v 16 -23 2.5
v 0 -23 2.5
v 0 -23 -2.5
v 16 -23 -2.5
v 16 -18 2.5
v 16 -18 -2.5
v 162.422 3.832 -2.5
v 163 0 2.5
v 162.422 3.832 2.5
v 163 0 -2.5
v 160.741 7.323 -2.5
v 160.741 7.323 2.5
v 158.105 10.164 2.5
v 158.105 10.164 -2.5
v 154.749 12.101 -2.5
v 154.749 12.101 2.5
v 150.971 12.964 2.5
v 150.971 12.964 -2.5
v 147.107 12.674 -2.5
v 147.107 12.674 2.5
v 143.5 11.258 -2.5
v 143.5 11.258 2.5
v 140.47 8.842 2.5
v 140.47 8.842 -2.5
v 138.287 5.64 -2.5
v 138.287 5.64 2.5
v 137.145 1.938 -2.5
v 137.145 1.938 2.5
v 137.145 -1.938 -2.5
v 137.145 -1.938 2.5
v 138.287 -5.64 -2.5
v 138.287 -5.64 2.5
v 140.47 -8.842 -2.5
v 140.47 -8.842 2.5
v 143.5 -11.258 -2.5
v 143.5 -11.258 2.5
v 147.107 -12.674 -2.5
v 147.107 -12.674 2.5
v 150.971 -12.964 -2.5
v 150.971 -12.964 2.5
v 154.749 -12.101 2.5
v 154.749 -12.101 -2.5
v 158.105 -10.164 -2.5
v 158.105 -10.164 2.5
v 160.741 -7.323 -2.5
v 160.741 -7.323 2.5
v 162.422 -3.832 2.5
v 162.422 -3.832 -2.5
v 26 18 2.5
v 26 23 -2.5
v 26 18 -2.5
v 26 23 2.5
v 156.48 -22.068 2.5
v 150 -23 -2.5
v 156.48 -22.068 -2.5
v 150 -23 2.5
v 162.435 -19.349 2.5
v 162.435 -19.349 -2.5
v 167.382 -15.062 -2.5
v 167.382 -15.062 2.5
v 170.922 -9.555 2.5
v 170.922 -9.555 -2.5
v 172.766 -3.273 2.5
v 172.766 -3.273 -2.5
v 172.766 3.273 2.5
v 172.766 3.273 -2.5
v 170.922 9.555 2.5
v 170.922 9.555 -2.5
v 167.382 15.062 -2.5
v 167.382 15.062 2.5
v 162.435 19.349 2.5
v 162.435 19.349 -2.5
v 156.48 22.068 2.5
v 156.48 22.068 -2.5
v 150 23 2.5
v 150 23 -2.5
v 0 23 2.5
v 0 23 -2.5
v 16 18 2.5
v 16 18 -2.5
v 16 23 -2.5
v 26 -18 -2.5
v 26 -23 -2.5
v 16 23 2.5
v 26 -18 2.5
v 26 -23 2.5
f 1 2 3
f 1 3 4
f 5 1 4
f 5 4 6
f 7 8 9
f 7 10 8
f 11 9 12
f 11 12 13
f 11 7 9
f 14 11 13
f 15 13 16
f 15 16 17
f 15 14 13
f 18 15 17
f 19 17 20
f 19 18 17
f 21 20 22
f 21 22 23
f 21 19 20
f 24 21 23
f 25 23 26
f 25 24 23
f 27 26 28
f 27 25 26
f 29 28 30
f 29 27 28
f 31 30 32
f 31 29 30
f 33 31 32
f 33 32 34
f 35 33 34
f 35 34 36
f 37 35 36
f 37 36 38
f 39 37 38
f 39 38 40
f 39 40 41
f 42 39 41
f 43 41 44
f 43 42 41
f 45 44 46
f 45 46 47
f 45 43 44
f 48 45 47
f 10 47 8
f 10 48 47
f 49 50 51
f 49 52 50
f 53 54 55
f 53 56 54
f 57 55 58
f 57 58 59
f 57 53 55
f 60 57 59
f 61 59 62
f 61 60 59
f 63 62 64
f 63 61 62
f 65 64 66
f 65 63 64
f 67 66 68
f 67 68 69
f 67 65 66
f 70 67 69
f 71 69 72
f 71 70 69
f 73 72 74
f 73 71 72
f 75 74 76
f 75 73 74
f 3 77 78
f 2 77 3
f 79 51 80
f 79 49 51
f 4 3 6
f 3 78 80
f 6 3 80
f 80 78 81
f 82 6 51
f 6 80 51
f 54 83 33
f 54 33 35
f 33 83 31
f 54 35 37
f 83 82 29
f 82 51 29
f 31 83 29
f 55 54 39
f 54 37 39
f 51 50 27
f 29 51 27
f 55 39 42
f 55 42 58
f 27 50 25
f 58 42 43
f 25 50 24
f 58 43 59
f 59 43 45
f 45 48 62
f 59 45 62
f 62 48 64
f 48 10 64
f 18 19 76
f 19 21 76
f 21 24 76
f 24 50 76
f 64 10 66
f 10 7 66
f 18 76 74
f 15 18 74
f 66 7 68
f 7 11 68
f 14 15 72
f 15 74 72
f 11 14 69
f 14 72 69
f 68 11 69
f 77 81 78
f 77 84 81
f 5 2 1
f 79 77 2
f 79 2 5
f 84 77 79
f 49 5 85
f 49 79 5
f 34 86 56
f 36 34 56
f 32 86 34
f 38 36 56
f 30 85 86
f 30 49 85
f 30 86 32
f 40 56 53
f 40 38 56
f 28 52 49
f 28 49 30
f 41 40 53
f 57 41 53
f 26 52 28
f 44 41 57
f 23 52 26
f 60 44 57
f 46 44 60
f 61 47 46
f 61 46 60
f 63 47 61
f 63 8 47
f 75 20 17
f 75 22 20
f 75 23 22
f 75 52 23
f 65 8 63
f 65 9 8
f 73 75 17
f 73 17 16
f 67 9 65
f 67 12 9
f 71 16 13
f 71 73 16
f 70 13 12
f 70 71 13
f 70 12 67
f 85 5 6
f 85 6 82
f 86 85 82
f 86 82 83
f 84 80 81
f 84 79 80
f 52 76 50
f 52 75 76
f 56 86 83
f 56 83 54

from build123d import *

# Parameters (mm, degrees)
SKETCH1_R           = 13
BOSS_EXTRUDE1_DEPTH = 2.5


with BuildPart() as part:
    # Sketch1 → Boss-Extrude1 (new, symmetric)
    with BuildSketch(Plane.XY):
        with BuildLine():
            Line((16, 23), (0, 23))
            Line((0, 23), (0, -23))
            Line((0, -23), (16, -23))
            Line((16, -23), (16, -18))
            Line((16, -18), (26, -18))
            Line((26, -18), (26, -23))
            Line((26, -23), (150, -23))
            ThreePointArc((150, -23), (173, 0), (150, 23))
            Line((150, 23), (26, 23))
            Line((26, 23), (26, 18))
            Line((26, 18), (16, 18))
            Line((16, 18), (16, 23))
        make_face()
        with Locations((150, 0)):
            Circle(SKETCH1_R, mode=Mode.SUBTRACT)
    extrude(amount=BOSS_EXTRUDE1_DEPTH, both=True)


solid = part.part
